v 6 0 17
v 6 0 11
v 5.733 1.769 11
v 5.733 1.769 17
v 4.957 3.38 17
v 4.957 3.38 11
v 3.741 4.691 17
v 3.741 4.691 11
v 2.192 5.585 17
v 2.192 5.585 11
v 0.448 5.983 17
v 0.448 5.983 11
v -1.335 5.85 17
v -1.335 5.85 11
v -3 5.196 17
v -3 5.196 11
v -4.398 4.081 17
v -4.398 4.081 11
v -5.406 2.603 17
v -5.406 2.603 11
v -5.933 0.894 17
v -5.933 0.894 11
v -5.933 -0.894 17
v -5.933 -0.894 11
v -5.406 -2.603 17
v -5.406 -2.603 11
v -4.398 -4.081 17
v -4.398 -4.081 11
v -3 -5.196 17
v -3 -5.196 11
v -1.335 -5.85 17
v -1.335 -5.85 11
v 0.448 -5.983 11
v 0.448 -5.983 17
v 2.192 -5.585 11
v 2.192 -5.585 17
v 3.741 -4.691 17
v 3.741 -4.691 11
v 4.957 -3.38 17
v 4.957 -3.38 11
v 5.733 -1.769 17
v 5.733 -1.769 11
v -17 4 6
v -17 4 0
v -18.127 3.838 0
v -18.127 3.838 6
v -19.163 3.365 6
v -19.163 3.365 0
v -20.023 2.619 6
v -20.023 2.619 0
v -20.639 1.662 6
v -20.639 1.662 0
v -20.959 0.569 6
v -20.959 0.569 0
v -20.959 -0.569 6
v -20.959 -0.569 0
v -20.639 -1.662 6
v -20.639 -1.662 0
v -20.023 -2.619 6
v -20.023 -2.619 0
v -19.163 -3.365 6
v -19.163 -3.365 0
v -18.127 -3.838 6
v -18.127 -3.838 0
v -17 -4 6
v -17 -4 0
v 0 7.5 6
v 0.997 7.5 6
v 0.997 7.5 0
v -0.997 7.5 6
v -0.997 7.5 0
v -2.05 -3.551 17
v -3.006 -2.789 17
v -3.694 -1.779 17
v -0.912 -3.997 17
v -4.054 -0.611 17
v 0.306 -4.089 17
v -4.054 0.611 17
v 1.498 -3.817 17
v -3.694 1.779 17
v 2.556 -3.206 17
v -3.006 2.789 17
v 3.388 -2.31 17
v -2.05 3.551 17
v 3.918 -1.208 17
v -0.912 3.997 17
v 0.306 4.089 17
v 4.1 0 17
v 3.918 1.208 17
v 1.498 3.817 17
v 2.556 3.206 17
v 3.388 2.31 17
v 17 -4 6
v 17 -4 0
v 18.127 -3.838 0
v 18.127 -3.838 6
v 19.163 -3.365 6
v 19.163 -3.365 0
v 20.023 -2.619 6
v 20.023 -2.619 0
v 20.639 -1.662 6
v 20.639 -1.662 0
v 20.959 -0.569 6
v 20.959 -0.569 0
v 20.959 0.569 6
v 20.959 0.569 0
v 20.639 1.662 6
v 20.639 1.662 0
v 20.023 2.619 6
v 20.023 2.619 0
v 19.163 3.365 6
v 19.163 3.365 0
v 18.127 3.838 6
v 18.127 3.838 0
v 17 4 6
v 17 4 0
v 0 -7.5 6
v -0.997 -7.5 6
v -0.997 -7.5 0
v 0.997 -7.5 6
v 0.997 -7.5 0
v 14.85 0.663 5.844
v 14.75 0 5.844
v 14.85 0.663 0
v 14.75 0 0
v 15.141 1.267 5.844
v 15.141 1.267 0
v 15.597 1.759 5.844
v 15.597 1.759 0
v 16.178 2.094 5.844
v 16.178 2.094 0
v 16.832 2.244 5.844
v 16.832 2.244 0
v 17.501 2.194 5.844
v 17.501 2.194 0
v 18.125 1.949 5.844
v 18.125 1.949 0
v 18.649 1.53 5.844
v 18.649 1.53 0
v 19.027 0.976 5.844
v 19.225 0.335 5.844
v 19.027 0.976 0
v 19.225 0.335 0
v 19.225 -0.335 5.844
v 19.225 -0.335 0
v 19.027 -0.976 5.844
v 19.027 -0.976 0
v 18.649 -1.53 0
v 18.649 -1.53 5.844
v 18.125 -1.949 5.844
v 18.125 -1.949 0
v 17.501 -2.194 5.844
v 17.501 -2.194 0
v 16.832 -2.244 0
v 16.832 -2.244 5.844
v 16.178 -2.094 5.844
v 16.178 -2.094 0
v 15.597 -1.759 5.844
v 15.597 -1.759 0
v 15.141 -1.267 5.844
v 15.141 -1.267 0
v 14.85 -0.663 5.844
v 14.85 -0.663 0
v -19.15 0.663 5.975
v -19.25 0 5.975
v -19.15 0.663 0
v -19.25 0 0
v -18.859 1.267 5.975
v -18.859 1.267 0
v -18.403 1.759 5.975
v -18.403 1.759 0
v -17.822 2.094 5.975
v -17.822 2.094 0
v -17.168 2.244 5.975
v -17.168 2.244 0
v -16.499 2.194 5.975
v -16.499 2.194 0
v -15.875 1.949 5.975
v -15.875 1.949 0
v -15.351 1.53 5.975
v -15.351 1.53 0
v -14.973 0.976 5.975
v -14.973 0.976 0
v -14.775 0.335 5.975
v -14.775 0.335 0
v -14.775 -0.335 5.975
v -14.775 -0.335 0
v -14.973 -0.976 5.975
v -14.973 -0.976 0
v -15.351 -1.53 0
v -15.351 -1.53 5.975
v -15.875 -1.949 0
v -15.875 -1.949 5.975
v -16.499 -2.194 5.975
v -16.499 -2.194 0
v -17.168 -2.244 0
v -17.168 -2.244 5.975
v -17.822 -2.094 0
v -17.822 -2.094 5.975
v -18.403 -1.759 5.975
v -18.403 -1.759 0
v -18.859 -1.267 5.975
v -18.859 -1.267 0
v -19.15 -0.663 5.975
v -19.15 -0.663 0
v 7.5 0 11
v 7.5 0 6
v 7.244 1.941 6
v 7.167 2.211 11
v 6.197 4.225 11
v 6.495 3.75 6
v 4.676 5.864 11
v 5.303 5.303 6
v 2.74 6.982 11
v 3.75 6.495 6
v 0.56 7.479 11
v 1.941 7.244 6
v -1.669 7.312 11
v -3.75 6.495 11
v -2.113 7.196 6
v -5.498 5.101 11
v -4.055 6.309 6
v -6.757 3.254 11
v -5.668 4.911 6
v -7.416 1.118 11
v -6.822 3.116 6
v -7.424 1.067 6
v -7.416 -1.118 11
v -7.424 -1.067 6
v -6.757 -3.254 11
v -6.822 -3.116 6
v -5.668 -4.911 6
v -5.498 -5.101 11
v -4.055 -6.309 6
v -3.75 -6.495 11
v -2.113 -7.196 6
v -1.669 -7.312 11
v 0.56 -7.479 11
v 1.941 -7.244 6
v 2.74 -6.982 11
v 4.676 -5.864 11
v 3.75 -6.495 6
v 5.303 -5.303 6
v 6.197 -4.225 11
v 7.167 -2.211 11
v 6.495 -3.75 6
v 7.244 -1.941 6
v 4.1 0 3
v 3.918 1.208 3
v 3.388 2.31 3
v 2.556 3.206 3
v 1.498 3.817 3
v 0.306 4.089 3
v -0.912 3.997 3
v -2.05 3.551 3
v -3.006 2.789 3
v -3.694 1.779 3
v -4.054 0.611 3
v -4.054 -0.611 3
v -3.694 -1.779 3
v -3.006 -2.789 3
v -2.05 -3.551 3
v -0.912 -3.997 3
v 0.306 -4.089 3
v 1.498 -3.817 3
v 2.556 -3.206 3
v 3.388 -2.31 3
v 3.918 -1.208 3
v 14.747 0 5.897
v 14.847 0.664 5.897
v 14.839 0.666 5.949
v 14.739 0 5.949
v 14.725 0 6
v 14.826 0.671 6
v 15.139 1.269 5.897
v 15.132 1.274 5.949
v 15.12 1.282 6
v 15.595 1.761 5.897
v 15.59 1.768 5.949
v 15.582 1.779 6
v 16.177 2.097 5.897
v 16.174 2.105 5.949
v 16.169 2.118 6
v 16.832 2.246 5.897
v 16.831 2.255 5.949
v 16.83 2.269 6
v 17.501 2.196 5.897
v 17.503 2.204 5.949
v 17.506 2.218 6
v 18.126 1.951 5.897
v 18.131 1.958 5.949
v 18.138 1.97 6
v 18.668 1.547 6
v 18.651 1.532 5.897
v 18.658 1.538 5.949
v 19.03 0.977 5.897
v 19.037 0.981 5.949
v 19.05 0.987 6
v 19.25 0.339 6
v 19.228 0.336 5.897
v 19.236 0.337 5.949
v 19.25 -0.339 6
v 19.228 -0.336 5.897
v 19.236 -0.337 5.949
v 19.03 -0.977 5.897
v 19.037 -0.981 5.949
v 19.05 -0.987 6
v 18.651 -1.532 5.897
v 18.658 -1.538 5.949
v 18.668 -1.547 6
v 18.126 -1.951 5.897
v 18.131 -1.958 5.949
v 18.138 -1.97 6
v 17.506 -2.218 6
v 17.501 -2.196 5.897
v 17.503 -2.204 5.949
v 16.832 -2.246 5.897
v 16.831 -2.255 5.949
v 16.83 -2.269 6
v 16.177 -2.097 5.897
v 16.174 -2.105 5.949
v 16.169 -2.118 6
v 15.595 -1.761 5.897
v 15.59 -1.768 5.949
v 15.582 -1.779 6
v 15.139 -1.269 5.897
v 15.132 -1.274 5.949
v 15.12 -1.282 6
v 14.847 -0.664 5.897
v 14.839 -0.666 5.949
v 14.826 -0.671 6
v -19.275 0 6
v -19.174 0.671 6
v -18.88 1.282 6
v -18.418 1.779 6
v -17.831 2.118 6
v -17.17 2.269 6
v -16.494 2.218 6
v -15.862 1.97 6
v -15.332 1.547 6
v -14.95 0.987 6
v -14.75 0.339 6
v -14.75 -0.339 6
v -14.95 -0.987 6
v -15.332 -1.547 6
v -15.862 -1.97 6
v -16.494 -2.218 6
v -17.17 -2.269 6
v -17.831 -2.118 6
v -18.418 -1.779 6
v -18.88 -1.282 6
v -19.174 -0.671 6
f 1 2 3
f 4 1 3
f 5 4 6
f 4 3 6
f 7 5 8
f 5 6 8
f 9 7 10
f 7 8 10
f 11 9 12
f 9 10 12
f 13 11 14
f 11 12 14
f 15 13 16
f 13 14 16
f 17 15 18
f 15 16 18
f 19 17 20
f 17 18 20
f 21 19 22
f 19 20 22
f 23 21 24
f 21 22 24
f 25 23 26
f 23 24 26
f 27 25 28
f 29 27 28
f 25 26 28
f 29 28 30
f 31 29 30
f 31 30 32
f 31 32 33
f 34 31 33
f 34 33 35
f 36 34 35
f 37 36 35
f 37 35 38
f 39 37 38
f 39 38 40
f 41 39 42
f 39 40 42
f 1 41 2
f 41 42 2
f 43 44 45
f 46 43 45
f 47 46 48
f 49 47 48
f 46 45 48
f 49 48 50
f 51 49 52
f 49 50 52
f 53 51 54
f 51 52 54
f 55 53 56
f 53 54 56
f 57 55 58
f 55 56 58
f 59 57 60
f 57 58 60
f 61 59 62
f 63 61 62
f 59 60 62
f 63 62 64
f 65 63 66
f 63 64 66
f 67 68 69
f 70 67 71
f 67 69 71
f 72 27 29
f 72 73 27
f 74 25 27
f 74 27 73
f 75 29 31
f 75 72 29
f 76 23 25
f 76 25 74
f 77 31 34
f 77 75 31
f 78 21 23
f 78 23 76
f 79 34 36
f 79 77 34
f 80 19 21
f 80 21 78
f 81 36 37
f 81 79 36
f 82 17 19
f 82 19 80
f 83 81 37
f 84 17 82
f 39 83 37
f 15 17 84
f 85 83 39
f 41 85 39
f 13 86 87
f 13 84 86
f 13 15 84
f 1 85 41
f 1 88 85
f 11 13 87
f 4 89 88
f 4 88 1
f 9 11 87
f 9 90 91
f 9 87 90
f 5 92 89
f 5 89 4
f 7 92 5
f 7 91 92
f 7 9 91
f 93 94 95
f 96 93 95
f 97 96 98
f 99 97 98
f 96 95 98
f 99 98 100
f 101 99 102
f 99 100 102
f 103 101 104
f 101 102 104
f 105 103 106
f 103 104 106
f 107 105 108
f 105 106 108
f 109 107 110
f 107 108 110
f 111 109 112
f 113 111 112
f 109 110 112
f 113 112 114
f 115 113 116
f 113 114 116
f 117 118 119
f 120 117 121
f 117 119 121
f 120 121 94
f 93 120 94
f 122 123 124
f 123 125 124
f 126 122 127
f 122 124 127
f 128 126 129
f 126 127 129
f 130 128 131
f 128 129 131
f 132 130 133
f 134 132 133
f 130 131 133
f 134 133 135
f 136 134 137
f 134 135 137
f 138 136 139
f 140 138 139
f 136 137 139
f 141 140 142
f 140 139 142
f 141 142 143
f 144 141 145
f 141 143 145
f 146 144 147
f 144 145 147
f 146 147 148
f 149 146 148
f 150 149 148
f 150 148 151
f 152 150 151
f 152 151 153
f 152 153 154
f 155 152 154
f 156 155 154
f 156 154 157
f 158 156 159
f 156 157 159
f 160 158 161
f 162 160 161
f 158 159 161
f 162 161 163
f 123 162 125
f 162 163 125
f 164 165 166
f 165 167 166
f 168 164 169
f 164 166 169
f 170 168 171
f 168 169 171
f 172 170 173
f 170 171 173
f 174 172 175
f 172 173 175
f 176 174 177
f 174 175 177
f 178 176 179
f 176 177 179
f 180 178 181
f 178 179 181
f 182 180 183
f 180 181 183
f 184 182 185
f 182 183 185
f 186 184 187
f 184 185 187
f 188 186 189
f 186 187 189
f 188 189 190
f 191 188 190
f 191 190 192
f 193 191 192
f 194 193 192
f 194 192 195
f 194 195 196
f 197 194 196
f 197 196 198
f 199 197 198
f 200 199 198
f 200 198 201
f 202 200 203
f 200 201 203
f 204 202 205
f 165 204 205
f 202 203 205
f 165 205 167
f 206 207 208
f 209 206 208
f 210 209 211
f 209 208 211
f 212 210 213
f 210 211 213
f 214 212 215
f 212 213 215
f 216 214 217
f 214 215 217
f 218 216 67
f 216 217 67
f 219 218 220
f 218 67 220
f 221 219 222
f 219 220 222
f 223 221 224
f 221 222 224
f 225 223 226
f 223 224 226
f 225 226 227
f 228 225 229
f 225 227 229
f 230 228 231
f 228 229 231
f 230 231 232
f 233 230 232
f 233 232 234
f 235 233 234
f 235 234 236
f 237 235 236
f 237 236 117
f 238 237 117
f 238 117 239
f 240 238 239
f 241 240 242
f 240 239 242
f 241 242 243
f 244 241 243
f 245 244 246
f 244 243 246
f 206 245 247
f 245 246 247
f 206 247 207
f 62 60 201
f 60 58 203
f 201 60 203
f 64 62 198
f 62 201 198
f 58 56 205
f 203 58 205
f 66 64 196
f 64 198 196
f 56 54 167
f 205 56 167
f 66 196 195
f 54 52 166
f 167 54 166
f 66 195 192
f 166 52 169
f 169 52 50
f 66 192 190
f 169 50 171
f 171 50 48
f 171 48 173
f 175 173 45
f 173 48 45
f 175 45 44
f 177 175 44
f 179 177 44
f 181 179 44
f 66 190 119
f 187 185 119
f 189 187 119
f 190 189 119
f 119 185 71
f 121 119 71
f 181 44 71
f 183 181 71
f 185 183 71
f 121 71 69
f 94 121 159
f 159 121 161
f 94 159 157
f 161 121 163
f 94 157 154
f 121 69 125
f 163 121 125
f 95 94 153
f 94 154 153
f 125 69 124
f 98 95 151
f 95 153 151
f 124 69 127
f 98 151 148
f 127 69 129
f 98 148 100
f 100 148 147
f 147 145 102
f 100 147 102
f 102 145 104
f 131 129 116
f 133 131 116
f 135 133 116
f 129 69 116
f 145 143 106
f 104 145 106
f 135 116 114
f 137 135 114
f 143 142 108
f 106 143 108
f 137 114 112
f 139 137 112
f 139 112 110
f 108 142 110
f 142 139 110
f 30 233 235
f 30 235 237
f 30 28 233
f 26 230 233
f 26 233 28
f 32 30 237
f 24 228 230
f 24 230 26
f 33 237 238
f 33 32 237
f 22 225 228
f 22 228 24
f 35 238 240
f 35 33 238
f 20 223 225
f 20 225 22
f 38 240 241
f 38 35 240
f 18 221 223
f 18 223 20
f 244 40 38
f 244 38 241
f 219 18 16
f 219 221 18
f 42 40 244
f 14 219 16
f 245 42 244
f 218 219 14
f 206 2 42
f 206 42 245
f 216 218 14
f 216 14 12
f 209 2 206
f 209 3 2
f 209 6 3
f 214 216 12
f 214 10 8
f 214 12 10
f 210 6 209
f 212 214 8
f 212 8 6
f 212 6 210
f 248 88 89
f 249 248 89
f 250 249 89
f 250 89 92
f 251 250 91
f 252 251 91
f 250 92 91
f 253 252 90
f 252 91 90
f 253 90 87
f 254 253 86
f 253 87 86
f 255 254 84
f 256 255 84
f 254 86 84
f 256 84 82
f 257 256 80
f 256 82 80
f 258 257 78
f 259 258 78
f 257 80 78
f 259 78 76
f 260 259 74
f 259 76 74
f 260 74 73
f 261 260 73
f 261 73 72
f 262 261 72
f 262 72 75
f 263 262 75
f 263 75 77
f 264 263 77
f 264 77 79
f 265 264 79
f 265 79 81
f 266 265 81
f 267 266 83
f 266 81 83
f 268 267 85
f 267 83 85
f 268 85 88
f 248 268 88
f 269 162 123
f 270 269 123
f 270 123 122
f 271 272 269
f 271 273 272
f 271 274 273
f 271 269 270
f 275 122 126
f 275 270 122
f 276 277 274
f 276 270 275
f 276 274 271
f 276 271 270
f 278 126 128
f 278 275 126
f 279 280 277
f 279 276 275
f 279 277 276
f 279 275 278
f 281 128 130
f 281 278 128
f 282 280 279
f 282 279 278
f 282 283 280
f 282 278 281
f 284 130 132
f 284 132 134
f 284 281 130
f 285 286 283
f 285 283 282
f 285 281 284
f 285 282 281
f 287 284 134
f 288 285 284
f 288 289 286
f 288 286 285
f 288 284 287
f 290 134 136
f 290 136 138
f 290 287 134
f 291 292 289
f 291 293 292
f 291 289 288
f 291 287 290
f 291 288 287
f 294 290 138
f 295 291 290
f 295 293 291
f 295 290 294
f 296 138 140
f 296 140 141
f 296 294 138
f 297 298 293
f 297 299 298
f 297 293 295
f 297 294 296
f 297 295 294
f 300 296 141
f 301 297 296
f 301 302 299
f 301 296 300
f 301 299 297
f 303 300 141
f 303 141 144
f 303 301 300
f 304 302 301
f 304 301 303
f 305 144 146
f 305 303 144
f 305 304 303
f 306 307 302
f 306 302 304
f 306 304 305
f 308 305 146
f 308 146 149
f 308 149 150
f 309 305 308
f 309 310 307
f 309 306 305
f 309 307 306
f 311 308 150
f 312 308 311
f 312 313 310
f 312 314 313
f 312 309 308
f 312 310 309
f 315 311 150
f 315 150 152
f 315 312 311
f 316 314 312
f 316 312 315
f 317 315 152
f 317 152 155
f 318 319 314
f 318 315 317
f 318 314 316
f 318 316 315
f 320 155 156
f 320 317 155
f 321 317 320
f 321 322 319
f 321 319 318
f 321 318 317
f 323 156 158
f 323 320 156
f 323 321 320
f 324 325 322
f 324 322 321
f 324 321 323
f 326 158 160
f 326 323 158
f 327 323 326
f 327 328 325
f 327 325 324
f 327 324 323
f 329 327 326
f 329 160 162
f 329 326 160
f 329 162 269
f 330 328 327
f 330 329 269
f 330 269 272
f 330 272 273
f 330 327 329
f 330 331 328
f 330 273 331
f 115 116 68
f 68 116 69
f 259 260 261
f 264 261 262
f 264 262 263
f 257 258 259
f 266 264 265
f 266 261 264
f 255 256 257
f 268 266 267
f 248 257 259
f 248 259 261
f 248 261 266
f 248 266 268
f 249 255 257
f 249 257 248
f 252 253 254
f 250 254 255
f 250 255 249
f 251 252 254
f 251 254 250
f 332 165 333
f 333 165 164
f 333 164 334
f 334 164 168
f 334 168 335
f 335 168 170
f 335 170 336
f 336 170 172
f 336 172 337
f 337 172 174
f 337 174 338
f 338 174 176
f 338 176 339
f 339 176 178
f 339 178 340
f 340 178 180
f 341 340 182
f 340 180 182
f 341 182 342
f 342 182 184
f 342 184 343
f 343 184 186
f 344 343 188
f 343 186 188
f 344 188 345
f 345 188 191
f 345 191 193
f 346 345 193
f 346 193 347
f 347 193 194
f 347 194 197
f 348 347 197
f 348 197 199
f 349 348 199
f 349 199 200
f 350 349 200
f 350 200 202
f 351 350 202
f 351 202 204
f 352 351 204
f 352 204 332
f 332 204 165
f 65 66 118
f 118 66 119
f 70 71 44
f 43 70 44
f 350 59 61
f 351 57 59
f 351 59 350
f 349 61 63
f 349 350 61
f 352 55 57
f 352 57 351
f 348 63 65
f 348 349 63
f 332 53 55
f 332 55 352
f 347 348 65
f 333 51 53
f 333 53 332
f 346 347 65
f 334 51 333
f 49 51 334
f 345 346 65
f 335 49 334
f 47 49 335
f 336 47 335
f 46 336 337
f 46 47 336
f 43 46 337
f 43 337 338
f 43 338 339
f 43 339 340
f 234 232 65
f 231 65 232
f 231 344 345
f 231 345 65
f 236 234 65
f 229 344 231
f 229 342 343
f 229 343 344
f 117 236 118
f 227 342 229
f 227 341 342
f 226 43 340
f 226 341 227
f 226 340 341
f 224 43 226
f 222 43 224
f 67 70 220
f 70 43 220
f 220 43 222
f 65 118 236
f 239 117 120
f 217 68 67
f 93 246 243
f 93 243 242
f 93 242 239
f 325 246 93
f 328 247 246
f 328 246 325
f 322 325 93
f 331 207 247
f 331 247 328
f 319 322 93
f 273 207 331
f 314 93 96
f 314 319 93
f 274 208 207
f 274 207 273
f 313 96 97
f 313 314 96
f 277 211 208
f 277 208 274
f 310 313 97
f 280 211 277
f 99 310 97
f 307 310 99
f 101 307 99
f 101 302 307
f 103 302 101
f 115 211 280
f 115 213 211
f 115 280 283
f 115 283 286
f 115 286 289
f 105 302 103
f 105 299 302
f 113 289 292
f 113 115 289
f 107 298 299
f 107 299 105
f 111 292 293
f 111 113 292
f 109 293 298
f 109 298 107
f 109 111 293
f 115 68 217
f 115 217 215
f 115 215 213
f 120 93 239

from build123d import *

# Parameters (mm, degrees)
BOSS_EXTRUDE1_DEPTH            = 6
BOSS_EXTRUDE2_DEPTH            = 5
BOSS_EXTRUDE2_DEPTH_BACK       = 6
SKETCH2_R                      = 7.5
SKETCH3_R                      = 6
BOSS_EXTRUDE3_DEPTH            = 6
SKETCH4_R                      = 4.1
CUT_EXTRUDE1_DEPTH             = 14
M4_CLEARANCE_HOLE1_D           = 4.5
M4_CLEARANCE_HOLE1_CSINK_D     = 4.55
M4_CLEARANCE_HOLE1_CSINK_ANGLE = 90
FILLET4_R                      = 0.5


with BuildPart() as part:
    # Sketch1 → Boss-Extrude1 (new body)
    with BuildSketch(Plane.XY):
        with BuildLine():
            Line((17, 4), (0.996565203, 7.5))
            Line((0.996565203, 7.5), (-0.996565203, 7.5))
            Line((-0.996565203, 7.5), (-17, 4))
            ThreePointArc((-17, 4), (-21, 0), (-17, -4))
            Line((-17, -4), (-0.996565203, -7.5))
            Line((-0.996565203, -7.5), (0.996565203, -7.5))
            Line((0.996565203, -7.5), (17, -4))
            ThreePointArc((17, -4), (21, 0), (17, 4))
        make_face()
    extrude(amount=BOSS_EXTRUDE1_DEPTH)

    # Sketch2 → Boss-Extrude2 (add, two sides: drawn at the far end of the back side and taken through both)
    with BuildSketch(Plane.XY.offset(6).offset(-BOSS_EXTRUDE2_DEPTH_BACK)):
        Circle(SKETCH2_R)
    extrude(amount=BOSS_EXTRUDE2_DEPTH + BOSS_EXTRUDE2_DEPTH_BACK)

    # Sketch3 → Boss-Extrude3 (add)
    with BuildSketch(Plane.XY.offset(11)):
        Circle(SKETCH3_R)
    extrude(amount=BOSS_EXTRUDE3_DEPTH)

    # Sketch4 → Cut-Extrude1 (cut)
    with BuildSketch(Plane.XY.offset(17)):
        Circle(SKETCH4_R)
    extrude(amount=-CUT_EXTRUDE1_DEPTH, mode=Mode.SUBTRACT)

    # M4 Clearance Hole1 (through all)
    with Locations(Plane(origin=(17, 0, 6), x_dir=(1, 0, 0), z_dir=(0, 0, 1))):
        with Locations((0, 0), (-34, 0)):
            CounterSinkHole(M4_CLEARANCE_HOLE1_D / 2, M4_CLEARANCE_HOLE1_CSINK_D / 2, counter_sink_angle=M4_CLEARANCE_HOLE1_CSINK_ANGLE)

    # Fillet4
    # the kernel refuses this fillet: 0.5 mm, written as the material it takes off along each edge
    with BuildSketch(Plane(origin=(17, 0, 5.975), x_dir=(-1, 0, 0), z_dir=(0, -1, 0))) as fillet4_piece_1:
        with BuildLine():
            CenterArc((2.75, 0.13112495), FILLET4_R, 180, 18.194872339)
            Line((2.25, 0.13112495), (2.24, 0.13112495))
            Line((2.24, 0.13112495), (2.24, 0))
            Line((2.24, 0), (2.242928932, -0.007071068))
            ThreePointArc((2.242928932, -0.007071068), (2.255428932, -0.019571068), (2.2655, -0.028122499))
            Line((2.2655, -0.028122499), (2.275, -0.025))
        make_face()
    revolve(axis=Axis((17, 0, 5.975), (0, 0, -1)), mode=Mode.SUBTRACT)


solid = part.part
